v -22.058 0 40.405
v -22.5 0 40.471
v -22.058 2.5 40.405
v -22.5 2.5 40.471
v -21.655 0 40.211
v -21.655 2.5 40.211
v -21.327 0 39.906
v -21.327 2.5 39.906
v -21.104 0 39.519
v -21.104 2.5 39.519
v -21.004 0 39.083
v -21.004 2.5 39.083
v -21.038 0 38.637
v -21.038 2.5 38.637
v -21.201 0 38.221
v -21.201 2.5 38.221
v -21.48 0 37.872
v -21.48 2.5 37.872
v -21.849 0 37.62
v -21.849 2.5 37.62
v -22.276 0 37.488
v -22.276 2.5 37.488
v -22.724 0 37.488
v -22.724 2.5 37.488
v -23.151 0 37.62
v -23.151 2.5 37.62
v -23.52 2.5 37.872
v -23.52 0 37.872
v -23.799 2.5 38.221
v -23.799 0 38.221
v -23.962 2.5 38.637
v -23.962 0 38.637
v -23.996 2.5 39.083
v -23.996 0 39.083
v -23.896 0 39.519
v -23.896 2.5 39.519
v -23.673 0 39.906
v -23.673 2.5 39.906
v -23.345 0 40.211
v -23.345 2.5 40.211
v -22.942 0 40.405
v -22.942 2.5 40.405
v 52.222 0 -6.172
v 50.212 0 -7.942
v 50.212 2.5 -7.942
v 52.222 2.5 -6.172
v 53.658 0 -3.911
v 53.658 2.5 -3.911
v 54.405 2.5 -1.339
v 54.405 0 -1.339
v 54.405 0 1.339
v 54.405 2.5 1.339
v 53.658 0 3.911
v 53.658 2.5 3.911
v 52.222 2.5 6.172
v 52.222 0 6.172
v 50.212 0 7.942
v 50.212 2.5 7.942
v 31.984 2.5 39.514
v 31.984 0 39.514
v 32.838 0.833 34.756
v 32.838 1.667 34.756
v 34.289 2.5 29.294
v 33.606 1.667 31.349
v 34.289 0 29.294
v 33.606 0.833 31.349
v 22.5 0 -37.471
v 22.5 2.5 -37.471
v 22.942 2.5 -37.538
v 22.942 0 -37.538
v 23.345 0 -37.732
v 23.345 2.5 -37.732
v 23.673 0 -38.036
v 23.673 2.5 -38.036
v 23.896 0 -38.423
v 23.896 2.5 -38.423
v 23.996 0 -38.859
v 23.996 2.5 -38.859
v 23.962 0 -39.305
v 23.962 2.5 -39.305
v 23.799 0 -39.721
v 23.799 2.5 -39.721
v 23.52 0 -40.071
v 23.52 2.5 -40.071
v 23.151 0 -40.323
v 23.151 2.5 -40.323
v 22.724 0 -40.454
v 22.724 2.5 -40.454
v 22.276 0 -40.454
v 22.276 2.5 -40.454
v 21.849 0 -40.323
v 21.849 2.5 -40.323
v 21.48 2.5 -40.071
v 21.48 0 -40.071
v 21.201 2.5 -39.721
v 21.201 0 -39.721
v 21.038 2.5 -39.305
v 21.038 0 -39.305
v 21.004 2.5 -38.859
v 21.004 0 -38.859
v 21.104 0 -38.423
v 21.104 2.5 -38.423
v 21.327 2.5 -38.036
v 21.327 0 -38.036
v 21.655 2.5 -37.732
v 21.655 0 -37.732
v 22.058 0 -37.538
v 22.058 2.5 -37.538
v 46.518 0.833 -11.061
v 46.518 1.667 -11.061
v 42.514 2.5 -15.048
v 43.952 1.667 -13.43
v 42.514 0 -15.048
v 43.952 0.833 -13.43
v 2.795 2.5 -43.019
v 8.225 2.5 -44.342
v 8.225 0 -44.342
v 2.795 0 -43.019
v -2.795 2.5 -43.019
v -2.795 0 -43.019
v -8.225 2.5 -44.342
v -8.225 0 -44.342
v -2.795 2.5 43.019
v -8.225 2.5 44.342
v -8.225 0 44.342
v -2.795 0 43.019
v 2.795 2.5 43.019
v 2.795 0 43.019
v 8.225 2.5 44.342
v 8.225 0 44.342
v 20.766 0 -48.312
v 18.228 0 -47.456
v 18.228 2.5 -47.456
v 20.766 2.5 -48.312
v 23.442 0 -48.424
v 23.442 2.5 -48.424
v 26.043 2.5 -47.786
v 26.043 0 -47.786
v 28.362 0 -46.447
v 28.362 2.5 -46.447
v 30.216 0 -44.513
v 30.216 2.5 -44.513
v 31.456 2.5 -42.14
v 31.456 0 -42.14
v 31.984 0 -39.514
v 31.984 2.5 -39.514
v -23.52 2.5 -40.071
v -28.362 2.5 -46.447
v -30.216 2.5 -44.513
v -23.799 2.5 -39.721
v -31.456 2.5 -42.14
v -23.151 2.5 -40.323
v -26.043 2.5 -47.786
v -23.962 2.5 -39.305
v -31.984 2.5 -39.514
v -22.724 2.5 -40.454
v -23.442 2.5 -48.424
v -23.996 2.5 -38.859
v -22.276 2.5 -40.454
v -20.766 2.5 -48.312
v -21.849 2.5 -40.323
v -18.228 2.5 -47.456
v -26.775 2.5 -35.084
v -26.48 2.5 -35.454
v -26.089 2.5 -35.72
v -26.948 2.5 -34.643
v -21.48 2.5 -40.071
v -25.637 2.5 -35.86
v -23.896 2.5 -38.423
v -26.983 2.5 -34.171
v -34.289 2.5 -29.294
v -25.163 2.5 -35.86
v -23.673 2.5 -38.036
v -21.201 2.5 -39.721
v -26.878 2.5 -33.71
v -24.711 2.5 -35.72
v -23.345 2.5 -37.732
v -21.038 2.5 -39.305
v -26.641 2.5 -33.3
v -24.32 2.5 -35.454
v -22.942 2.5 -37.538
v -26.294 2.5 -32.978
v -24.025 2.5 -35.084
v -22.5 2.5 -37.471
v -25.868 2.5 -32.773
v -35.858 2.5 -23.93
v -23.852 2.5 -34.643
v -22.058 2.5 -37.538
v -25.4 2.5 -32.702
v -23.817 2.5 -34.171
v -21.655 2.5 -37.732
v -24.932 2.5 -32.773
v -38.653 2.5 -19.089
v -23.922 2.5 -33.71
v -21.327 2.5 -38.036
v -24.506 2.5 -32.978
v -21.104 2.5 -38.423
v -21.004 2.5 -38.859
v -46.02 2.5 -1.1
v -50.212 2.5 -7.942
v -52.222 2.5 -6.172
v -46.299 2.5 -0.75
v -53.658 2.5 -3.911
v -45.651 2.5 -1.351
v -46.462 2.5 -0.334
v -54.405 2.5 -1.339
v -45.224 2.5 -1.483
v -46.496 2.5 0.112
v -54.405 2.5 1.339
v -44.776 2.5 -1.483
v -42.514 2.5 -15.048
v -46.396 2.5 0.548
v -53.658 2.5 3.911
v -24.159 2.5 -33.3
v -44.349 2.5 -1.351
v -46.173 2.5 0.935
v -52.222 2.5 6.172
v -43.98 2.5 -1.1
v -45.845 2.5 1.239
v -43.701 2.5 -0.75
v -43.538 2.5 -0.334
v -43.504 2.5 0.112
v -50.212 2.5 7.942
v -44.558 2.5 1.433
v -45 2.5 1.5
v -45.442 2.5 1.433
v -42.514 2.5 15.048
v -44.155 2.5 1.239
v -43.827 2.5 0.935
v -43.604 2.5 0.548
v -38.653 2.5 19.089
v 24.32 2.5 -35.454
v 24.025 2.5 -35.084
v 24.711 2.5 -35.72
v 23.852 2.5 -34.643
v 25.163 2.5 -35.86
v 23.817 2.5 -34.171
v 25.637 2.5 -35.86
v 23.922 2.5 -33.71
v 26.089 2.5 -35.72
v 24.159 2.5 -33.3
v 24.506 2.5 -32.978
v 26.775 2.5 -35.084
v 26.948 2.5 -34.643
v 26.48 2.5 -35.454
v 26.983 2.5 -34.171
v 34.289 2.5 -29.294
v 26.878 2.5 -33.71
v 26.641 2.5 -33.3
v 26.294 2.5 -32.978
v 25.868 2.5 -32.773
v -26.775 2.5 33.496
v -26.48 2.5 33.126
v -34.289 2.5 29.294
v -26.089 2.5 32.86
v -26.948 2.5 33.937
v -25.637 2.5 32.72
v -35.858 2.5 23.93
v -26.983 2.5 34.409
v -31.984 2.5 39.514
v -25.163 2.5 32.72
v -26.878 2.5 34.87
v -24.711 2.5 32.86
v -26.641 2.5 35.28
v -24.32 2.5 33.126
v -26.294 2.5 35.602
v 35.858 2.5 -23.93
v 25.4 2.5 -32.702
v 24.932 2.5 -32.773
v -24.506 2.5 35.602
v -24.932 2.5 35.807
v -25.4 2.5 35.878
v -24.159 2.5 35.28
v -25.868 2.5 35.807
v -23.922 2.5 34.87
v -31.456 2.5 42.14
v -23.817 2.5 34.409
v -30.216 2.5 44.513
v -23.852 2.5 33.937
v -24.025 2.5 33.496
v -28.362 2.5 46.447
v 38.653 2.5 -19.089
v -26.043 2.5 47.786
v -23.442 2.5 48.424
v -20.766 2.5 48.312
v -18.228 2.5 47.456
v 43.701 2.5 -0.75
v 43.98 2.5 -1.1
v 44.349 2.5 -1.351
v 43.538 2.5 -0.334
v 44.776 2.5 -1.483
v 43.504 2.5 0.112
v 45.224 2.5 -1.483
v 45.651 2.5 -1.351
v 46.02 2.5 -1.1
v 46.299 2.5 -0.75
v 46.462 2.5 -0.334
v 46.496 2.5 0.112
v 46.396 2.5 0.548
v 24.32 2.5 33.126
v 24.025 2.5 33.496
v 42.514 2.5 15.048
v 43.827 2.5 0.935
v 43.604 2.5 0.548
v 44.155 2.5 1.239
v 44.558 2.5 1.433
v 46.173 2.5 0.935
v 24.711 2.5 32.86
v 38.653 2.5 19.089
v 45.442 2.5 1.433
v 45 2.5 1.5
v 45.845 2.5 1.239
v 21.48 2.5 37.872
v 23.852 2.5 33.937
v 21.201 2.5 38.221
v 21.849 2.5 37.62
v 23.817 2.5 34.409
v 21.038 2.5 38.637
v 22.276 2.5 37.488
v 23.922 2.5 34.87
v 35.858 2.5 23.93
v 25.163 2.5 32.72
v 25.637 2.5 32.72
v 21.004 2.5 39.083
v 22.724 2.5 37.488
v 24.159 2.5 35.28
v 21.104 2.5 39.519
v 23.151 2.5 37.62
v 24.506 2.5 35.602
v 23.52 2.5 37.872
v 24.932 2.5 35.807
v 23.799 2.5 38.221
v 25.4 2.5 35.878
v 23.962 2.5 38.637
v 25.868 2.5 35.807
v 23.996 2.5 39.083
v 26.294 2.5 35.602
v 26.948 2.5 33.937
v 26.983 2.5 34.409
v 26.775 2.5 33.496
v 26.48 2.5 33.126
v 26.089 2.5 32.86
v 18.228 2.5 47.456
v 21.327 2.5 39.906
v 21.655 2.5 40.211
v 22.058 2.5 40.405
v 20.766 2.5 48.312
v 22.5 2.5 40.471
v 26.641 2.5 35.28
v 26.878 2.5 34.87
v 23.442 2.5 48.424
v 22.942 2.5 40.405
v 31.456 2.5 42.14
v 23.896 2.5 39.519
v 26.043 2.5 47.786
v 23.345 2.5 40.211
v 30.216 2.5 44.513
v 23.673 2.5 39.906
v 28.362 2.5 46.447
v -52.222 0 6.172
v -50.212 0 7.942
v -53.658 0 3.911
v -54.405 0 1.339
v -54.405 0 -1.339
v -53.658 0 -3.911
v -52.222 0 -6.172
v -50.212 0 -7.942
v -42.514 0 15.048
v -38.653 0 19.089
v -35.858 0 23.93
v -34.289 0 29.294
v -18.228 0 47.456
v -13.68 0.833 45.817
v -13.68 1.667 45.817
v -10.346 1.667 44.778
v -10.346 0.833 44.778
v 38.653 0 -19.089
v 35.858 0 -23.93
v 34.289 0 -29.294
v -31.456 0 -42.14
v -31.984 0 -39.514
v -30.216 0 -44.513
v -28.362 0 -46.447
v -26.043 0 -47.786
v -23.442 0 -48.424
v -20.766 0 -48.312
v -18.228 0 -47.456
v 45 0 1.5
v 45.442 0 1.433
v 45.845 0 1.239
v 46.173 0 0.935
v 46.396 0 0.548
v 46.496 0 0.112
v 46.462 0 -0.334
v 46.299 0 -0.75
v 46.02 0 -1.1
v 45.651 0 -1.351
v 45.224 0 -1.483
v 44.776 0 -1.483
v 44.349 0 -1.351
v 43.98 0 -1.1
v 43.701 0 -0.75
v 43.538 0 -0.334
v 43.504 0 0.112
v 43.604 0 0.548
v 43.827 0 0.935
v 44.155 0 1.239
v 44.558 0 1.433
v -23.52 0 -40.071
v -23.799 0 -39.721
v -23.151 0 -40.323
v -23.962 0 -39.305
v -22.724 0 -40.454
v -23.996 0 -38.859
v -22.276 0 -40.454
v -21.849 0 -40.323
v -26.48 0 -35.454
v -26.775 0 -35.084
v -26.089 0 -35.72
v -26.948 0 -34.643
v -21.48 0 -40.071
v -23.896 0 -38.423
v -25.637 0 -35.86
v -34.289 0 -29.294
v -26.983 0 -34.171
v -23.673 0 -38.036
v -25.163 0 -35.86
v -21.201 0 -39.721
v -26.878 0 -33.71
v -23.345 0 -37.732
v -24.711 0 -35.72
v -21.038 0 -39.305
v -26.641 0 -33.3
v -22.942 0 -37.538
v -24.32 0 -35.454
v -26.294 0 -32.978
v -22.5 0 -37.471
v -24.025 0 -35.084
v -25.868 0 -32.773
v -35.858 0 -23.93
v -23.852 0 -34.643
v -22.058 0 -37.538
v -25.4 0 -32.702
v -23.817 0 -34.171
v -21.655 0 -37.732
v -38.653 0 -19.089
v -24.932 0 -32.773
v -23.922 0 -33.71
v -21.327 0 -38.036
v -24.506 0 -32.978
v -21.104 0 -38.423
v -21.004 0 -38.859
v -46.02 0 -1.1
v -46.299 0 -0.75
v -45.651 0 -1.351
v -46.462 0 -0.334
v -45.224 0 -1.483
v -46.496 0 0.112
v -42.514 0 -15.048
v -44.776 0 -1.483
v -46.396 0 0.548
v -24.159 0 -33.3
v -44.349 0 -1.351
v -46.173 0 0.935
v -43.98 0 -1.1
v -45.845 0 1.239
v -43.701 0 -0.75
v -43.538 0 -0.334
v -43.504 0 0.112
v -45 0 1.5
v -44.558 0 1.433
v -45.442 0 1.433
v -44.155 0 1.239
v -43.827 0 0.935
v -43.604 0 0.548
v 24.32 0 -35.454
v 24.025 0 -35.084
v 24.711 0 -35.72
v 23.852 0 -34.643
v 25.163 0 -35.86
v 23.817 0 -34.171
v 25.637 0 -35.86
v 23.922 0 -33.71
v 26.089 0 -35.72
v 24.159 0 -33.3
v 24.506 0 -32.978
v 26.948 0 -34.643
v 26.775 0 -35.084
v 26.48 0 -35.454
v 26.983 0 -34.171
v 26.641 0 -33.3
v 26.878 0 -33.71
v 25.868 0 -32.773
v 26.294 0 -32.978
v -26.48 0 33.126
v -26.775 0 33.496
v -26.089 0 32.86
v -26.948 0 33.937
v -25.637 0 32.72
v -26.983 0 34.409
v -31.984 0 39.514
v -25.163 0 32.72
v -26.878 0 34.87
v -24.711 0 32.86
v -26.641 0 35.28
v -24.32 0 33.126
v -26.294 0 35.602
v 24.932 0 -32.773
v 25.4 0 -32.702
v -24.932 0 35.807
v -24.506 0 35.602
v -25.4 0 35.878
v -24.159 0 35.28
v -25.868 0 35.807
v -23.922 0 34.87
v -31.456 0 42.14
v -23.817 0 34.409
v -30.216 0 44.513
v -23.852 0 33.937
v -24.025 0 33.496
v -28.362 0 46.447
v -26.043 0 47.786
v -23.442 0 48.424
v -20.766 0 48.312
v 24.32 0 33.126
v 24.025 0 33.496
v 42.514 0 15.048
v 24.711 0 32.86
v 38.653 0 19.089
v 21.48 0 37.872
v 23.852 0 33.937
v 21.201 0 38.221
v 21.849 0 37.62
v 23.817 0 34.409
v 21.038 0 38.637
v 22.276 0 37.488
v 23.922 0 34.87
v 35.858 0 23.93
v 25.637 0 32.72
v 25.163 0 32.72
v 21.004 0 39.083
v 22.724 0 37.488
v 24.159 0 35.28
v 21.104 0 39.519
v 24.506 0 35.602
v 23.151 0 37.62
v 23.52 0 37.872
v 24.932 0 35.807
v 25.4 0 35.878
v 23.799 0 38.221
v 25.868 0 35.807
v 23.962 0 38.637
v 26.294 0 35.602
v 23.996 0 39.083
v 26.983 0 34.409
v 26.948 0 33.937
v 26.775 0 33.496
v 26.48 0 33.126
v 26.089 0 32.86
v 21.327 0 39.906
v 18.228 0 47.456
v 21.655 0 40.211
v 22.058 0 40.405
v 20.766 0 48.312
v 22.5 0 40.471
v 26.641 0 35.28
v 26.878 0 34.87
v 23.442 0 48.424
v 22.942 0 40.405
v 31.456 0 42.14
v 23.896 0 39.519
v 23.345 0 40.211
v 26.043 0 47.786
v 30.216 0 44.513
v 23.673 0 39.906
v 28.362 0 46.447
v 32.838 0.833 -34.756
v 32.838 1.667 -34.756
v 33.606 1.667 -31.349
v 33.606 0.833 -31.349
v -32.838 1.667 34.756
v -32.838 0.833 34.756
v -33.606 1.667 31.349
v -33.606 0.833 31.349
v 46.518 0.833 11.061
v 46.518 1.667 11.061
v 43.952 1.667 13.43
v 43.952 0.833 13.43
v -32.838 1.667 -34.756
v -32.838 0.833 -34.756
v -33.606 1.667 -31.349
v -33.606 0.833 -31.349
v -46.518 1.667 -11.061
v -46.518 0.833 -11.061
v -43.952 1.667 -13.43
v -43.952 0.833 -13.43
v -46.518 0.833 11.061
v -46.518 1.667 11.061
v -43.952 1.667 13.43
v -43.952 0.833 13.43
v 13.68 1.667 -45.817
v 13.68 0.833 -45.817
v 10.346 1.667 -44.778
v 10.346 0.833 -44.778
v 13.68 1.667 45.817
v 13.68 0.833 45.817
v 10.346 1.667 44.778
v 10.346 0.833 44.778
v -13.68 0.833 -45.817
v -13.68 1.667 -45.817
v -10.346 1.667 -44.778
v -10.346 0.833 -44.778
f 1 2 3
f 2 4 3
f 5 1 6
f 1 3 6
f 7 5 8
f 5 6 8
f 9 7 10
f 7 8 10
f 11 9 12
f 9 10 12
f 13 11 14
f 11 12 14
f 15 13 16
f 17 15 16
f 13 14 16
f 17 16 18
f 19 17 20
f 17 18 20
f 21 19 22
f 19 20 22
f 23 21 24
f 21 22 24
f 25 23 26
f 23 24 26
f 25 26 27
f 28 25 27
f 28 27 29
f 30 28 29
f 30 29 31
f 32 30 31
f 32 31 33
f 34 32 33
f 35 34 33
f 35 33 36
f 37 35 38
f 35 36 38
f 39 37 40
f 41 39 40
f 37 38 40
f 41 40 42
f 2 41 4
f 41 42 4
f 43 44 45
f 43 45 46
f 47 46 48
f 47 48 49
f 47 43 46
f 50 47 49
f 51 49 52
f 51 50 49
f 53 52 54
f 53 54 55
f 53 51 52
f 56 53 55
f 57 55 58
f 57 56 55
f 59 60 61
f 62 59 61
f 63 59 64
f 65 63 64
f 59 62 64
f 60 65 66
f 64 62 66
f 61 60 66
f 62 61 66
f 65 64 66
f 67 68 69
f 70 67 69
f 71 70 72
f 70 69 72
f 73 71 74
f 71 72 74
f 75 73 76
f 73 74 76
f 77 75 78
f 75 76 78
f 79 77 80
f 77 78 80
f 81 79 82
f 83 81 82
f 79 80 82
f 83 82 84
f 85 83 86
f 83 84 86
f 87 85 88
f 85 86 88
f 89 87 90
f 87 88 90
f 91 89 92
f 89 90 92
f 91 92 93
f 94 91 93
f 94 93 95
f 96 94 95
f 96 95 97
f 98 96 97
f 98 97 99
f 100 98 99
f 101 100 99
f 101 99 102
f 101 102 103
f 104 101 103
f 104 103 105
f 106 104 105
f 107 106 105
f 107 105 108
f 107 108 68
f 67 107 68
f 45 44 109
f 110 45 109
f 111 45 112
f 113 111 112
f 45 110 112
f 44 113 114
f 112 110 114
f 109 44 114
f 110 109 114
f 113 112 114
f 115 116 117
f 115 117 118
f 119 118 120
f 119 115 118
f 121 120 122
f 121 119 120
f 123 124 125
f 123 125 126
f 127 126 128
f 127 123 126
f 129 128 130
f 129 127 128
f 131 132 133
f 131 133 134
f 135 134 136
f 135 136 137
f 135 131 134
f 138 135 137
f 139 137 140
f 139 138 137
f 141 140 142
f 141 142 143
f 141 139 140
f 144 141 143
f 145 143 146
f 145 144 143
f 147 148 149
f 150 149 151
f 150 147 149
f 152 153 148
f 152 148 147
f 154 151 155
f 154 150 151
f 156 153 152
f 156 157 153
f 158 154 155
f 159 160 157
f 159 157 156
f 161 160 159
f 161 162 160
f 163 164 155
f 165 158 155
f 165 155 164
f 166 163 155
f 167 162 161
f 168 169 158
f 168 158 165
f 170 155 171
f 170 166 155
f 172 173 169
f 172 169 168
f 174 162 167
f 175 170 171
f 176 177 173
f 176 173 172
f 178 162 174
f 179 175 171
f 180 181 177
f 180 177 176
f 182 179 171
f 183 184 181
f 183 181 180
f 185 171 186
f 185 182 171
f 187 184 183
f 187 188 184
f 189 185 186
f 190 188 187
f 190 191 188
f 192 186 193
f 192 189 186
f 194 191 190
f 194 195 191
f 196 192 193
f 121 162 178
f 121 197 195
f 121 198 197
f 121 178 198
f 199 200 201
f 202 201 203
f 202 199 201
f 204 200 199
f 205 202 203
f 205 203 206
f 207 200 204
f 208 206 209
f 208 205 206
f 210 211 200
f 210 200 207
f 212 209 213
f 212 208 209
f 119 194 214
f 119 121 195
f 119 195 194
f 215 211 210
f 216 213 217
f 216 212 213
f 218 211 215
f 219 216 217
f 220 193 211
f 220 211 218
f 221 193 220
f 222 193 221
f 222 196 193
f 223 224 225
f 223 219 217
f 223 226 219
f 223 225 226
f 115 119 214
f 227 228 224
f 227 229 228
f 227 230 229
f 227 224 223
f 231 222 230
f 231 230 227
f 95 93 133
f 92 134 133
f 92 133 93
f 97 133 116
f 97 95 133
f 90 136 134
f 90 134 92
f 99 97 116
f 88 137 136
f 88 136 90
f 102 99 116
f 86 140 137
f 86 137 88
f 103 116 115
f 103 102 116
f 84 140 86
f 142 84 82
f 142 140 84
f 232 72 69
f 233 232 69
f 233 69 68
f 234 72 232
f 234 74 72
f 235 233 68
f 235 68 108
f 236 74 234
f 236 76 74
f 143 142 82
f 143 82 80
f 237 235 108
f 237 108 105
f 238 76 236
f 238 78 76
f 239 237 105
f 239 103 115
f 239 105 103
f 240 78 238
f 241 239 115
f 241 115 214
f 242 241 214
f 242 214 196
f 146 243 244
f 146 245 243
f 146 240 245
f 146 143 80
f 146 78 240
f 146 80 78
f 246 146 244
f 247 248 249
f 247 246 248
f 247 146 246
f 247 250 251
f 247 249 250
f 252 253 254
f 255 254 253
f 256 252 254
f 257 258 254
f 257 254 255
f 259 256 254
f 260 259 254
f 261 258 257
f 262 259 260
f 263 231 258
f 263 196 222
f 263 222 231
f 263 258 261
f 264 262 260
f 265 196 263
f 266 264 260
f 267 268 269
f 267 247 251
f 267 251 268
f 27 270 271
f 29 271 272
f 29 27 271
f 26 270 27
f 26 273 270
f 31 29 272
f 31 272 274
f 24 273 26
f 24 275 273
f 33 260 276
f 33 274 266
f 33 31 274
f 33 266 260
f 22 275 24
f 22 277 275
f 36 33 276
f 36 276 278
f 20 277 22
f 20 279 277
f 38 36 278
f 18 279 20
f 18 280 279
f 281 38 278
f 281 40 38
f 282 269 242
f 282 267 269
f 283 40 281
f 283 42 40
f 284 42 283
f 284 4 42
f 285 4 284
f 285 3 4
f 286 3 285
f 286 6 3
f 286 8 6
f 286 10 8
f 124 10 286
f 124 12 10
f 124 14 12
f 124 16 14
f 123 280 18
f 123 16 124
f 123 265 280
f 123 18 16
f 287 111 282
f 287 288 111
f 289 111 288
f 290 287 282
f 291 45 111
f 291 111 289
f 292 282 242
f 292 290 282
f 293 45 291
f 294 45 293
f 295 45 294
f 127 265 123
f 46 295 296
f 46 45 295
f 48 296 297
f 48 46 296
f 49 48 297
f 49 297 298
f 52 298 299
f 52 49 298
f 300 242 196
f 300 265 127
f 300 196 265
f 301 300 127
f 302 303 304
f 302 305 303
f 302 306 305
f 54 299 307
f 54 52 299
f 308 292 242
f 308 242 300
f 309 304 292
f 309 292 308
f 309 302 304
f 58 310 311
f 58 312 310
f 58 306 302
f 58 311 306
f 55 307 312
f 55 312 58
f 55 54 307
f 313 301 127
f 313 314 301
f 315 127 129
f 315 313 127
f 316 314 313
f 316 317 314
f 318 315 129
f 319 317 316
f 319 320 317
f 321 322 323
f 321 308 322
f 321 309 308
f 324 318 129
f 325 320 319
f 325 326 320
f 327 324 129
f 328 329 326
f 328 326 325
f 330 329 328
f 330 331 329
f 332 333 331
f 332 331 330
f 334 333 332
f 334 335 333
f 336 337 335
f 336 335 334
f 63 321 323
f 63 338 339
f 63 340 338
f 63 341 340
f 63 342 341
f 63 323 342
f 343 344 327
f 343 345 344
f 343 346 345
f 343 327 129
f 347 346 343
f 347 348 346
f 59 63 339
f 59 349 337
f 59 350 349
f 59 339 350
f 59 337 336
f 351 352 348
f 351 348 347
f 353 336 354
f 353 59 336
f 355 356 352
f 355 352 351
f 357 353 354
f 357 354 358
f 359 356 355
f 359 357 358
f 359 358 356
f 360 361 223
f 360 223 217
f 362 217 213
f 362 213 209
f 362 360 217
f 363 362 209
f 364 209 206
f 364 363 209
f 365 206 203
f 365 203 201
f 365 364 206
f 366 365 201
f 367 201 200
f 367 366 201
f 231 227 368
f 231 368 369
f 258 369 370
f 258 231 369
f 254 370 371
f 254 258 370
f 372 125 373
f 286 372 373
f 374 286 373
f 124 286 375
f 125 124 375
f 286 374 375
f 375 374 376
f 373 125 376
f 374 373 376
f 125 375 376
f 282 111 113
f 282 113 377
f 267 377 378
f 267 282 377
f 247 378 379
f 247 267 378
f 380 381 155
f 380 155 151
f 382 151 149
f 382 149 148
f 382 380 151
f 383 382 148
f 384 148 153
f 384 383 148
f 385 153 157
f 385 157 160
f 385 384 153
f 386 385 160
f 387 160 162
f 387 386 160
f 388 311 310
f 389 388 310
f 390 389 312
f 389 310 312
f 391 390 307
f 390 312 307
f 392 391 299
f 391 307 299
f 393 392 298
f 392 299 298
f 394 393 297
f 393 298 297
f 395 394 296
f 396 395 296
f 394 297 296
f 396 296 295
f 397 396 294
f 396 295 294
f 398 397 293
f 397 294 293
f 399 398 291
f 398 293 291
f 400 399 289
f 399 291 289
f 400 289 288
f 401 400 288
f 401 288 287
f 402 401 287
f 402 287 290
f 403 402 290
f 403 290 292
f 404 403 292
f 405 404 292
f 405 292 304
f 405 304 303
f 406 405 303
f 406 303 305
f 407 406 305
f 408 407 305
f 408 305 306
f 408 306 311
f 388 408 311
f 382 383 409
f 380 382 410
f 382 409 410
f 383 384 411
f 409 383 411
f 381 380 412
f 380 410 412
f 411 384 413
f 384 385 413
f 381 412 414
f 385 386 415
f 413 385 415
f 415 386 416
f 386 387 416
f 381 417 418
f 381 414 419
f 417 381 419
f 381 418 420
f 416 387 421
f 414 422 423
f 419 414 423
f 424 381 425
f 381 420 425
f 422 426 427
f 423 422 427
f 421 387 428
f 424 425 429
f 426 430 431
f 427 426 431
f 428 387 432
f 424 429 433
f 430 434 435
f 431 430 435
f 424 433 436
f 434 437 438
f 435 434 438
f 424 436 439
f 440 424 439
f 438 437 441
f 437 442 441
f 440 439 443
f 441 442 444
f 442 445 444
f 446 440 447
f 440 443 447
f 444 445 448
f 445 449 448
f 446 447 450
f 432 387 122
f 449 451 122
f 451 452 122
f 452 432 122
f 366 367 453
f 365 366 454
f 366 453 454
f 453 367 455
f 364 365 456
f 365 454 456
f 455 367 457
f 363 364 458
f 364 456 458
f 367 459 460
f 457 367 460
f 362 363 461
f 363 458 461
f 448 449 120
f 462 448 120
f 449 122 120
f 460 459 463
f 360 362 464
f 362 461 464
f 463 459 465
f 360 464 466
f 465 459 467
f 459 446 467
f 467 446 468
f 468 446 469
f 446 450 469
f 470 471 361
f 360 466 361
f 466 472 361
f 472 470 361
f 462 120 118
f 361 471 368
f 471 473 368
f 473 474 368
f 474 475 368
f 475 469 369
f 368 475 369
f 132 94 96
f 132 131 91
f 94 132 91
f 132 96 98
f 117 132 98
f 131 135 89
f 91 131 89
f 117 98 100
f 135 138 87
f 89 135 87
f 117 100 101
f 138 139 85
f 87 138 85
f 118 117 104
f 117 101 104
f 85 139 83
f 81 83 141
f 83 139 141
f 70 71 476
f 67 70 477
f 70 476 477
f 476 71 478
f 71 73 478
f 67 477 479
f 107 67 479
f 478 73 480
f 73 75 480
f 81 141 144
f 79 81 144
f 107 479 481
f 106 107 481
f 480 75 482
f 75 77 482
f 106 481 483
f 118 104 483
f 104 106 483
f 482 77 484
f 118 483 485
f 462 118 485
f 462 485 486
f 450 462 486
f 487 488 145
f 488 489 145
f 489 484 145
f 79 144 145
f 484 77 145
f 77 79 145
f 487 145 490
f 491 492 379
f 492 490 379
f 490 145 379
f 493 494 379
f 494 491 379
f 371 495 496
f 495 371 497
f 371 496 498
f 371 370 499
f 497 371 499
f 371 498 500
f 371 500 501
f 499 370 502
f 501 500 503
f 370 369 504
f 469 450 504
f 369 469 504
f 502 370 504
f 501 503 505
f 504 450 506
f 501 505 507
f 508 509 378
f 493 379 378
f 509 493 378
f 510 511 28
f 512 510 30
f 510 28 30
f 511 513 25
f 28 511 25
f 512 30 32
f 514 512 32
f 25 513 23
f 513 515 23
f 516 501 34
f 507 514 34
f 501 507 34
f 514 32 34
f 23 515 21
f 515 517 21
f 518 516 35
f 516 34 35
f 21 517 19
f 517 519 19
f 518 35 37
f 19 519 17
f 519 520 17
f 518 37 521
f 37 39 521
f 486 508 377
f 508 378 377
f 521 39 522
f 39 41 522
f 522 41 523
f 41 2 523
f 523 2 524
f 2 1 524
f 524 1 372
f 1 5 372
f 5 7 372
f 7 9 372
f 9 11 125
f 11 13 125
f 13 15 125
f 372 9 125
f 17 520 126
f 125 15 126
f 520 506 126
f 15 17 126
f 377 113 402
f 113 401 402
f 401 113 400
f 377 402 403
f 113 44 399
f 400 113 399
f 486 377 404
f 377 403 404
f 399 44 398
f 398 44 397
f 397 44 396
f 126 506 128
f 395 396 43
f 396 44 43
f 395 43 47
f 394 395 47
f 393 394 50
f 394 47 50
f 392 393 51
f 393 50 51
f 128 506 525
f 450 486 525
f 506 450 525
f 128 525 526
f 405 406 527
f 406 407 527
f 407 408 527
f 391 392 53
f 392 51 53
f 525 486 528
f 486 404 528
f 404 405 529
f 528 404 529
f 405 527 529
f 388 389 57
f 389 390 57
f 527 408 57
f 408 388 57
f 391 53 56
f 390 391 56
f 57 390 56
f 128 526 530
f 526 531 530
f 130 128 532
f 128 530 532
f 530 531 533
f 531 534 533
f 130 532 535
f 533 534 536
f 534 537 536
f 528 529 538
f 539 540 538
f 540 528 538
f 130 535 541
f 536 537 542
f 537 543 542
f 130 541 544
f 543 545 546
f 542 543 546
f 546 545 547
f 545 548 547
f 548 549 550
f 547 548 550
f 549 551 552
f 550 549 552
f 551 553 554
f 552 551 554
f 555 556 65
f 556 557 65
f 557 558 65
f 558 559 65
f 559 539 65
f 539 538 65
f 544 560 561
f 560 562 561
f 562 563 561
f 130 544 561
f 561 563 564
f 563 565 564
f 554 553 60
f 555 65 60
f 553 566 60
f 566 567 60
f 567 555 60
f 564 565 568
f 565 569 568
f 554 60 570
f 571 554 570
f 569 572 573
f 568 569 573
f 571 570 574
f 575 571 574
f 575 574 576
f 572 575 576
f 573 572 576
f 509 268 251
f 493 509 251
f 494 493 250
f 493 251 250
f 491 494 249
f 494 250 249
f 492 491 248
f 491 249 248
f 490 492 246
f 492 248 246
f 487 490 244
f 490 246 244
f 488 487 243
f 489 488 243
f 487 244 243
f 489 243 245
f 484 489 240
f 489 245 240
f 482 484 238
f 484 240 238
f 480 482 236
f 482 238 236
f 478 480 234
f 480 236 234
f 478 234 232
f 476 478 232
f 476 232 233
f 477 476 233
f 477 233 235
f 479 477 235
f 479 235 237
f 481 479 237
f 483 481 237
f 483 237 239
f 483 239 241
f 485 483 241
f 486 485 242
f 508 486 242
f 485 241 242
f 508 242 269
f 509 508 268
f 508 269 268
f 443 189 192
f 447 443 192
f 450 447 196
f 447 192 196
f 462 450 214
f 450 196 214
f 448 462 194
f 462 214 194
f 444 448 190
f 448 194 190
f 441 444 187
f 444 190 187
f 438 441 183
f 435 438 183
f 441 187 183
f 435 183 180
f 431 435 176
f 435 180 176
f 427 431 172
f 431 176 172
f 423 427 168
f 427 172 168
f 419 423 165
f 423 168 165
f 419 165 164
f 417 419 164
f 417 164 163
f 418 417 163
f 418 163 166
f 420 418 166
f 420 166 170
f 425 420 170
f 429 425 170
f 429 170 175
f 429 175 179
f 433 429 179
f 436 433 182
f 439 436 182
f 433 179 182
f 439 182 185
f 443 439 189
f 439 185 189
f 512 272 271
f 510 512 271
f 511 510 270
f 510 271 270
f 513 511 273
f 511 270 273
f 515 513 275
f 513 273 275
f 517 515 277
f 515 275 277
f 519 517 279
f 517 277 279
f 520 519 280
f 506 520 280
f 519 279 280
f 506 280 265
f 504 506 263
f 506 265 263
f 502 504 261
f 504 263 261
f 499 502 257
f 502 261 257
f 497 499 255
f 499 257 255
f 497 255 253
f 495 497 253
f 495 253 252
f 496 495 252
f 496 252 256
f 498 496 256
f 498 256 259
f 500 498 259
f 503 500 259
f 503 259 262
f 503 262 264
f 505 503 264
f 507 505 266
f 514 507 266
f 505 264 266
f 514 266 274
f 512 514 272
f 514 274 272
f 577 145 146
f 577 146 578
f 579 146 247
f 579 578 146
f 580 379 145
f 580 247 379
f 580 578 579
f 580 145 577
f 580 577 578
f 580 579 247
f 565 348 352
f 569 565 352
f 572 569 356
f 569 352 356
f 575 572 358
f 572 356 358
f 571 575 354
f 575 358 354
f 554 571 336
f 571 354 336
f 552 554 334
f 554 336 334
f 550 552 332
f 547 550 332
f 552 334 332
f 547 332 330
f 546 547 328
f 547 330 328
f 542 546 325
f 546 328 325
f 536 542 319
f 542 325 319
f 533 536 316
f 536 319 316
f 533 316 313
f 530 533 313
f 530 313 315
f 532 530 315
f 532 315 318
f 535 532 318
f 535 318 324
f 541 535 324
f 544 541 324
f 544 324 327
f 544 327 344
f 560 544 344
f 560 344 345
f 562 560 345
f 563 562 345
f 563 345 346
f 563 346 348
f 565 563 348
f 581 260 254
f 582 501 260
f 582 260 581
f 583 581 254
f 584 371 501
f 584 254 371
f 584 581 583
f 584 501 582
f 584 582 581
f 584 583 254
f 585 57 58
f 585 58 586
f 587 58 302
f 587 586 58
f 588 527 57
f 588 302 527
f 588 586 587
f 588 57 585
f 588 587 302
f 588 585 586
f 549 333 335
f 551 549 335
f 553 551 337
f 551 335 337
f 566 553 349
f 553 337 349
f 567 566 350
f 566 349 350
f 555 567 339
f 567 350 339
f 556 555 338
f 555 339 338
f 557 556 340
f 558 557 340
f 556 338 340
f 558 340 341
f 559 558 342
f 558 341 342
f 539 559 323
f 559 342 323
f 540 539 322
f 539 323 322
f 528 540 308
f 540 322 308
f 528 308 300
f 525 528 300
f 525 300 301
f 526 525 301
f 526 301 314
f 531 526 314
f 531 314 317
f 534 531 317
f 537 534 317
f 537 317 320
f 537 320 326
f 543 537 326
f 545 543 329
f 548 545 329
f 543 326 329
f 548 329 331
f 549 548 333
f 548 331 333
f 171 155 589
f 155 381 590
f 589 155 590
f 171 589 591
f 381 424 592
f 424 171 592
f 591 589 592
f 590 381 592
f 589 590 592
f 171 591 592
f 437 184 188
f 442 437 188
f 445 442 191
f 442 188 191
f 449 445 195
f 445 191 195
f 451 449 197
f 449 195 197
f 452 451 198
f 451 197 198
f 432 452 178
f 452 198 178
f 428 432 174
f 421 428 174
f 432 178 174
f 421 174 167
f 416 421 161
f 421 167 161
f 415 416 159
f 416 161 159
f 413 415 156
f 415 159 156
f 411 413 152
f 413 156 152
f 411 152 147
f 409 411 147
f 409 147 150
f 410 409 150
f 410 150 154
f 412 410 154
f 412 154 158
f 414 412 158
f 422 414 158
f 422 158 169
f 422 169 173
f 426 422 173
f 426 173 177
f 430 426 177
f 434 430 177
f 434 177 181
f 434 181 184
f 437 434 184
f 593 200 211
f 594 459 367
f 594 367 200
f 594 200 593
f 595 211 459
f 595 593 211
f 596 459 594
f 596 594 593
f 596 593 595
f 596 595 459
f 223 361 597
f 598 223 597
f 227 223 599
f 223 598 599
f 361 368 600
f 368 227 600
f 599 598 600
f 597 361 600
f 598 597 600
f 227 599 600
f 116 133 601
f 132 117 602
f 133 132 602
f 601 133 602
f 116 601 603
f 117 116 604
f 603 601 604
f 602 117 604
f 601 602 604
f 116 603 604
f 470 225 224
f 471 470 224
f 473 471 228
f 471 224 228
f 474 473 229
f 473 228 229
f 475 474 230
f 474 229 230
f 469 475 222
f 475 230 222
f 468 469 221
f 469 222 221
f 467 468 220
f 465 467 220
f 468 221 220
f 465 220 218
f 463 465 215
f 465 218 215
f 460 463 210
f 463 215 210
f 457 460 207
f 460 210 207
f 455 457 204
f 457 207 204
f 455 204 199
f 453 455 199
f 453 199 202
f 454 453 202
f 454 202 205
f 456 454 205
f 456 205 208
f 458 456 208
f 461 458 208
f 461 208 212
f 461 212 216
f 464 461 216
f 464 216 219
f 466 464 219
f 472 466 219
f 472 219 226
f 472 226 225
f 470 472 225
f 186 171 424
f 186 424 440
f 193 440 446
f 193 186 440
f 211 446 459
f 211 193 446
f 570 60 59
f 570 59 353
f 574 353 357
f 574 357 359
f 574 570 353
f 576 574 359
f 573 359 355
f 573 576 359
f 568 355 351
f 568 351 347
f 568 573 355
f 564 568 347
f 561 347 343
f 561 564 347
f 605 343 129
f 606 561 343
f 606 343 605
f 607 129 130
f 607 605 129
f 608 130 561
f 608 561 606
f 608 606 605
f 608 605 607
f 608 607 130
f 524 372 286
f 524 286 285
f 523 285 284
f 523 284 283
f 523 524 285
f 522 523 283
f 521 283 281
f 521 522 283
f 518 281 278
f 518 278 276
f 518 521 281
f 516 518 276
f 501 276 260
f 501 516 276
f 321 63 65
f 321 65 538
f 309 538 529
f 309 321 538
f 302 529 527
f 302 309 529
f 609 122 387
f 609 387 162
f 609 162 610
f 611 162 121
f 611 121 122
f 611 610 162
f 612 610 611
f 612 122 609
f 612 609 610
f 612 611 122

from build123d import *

# Parameters (mm, degrees)
SKETCH1_R           = 45
BOSS_EXTRUDE2_DEPTH = 2.5
BOSS_EXTRUDE4_START = -2.5
BOSS_EXTRUDE4_DEPTH = 2.5
CIRPATTERN1_COUNT   = 6
CUT_EXTRUDE2_DEPTH  = 2.5
SKETCH6_R           = 1.5
CUT_EXTRUDE3_DEPTH  = 5
SKETCH7_R           = 1.5875
CUT_EXTRUDE4_DEPTH  = 2.5


with BuildPart() as part:
    # Sketch1 → Boss-Extrude2 (new body)
    with BuildSketch(Plane(origin=(0, 0, 0), x_dir=(1, 0, 0), z_dir=(0, 1, 0))):
        with Locations(Location((0, 0, 0), (0, 0, 270))):
            Circle(SKETCH1_R)
    extrude(amount=BOSS_EXTRUDE2_DEPTH)

    # Sketch2 → Boss-Extrude4 (add)
    with BuildSketch(Plane(origin=(0, 2.5, 0), x_dir=(1, 0, 0), z_dir=(0, 1, 0)).offset(BOSS_EXTRUDE4_START)):
        with BuildLine():
            ThreePointArc((-42.23454554, 15.532004475), (-45, 0), (-42.23454554, -15.532004475))
            add(Edge.make_bspline(
                [(-50.212380227, -7.942360629), (-45.3159648, -11.95963121), (-42.656686571, -14.489512492), (-42.23454554, -15.532004475)],
                knots=[0.089311832, 0.089311832, 0.089311832, 0.089311832, 1, 1, 1, 1], degree=3))
            ThreePointArc((-50.212380227, -7.942360629), (-54.5, 0), (-50.212380227, 7.942360629))
            add(Edge.make_bspline(
                [(-50.212380227, 7.942360629), (-45.3159648, 11.95963121), (-42.656686571, 14.489512492), (-42.23454554, 15.532004475)],
                knots=[0.089311832, 0.089311832, 0.089311832, 0.089311832, 1, 1, 1, 1], degree=3))
        make_face()
    boss_extrude4 = extrude(amount=BOSS_EXTRUDE4_DEPTH)

    # CirPattern1: Boss-Extrude4 ×6 about axis
    cirpattern1_axis = Axis((0, 2.5, 0), (0, 1, 0))
    for i in range(1, CIRPATTERN1_COUNT):
        add(boss_extrude4.rotate(cirpattern1_axis, i * 360 / CIRPATTERN1_COUNT))

    # Sketch5 → Cut-Extrude2 (cut)
    with BuildSketch(Plane(origin=(0, 2.5, 0), x_dir=(1, 0, 0), z_dir=(0, 1, 0))):
        with BuildLine():
            Line((-8.22468756, 44.342191593), (0, 46.65782144))
            Line((0, 46.65782144), (8.22468756, 44.342191593))
            ThreePointArc((8.22468756, 44.342191593), (0, 42.851652617), (-8.22468756, 44.342191593))
        make_face()
        with BuildLine():
            Line((40.406858652, 23.32891072), (42.513808159, 15.048307431))
            ThreePointArc((42.513808159, 15.048307431), (37.11061976, 21.425826308), (34.289120599, 29.293884161))
            Line((34.289120599, 29.293884161), (40.406858652, 23.32891072))
        make_face()
        with BuildLine():
            Line((40.406858652, -23.32891072), (34.289120599, -29.293884161))
            ThreePointArc((34.289120599, -29.293884161), (37.11061976, -21.425826308), (42.513808159, -15.048307431))
            Line((42.513808159, -15.048307431), (40.406858652, -23.32891072))
        make_face()
        with BuildLine():
            Line((0, -46.65782144), (-8.22468756, -44.342191593))
            ThreePointArc((-8.22468756, -44.342191593), (0, -42.851652617), (8.22468756, -44.342191593))
            Line((8.22468756, -44.342191593), (0, -46.65782144))
        make_face()
        with BuildLine():
            Line((-40.406858652, -23.32891072), (-42.513808159, -15.048307431))
            ThreePointArc((-42.513808159, -15.048307431), (-37.11061976, -21.425826308), (-34.289120599, -29.293884161))
            Line((-34.289120599, -29.293884161), (-40.406858652, -23.32891072))
        make_face()
        with BuildLine():
            Line((-40.406858652, 23.32891072), (-34.289120599, 29.293884161))
            ThreePointArc((-34.289120599, 29.293884161), (-37.11061976, 21.425826308), (-42.513808159, 15.048307431))
            Line((-42.513808159, 15.048307431), (-40.406858652, 23.32891072))
        make_face()
    extrude(amount=-CUT_EXTRUDE2_DEPTH, mode=Mode.SUBTRACT)

    # Sketch6 → Cut-Extrude3 (cut, symmetric)
    with BuildSketch(Plane(origin=(0, 2.5, 0), x_dir=(1, 0, 0), z_dir=(0, 1, 0))):
        with Locations(Location((-45, 0, 0), (0, 0, 270))):
            Circle(SKETCH6_R)
        with Locations(Location((-22.5, 38.97114317, 0), (0, 0, 270))):
            Circle(SKETCH6_R)
        with Locations(Location((22.5, 38.97114317, 0), (0, 0, 270))):
            Circle(SKETCH6_R)
        with Locations(Location((45, 0, 0), (0, 0, 270))):
            Circle(SKETCH6_R)
        with Locations(Location((22.5, -38.97114317, 0), (0, 0, 270))):
            Circle(SKETCH6_R)
        with Locations(Location((-22.5, -38.97114317, 0), (0, 0, 270))):
            Circle(SKETCH6_R)
    extrude(amount=CUT_EXTRUDE3_DEPTH, both=True, mode=Mode.SUBTRACT)

    # Sketch7 → Cut-Extrude4 (cut)
    with BuildSketch(Plane(origin=(0, 2.5, 0), x_dir=(1, 0, 0), z_dir=(0, 1, 0))):
        with Locations(Location((-25.4, 34.29, 0), (0, 0, 270))):
            Circle(SKETCH7_R)
        with Locations(Location((-25.4, -34.29, 0), (0, 0, 270))):
            Circle(SKETCH7_R)
        with Locations(Location((25.4, -34.29, 0), (0, 0, 270))):
            Circle(SKETCH7_R)
        with Locations(Location((25.4, 34.29, 0), (0, 0, 270))):
            Circle(SKETCH7_R)
    extrude(amount=-CUT_EXTRUDE4_DEPTH, mode=Mode.SUBTRACT)


solid = part.part
